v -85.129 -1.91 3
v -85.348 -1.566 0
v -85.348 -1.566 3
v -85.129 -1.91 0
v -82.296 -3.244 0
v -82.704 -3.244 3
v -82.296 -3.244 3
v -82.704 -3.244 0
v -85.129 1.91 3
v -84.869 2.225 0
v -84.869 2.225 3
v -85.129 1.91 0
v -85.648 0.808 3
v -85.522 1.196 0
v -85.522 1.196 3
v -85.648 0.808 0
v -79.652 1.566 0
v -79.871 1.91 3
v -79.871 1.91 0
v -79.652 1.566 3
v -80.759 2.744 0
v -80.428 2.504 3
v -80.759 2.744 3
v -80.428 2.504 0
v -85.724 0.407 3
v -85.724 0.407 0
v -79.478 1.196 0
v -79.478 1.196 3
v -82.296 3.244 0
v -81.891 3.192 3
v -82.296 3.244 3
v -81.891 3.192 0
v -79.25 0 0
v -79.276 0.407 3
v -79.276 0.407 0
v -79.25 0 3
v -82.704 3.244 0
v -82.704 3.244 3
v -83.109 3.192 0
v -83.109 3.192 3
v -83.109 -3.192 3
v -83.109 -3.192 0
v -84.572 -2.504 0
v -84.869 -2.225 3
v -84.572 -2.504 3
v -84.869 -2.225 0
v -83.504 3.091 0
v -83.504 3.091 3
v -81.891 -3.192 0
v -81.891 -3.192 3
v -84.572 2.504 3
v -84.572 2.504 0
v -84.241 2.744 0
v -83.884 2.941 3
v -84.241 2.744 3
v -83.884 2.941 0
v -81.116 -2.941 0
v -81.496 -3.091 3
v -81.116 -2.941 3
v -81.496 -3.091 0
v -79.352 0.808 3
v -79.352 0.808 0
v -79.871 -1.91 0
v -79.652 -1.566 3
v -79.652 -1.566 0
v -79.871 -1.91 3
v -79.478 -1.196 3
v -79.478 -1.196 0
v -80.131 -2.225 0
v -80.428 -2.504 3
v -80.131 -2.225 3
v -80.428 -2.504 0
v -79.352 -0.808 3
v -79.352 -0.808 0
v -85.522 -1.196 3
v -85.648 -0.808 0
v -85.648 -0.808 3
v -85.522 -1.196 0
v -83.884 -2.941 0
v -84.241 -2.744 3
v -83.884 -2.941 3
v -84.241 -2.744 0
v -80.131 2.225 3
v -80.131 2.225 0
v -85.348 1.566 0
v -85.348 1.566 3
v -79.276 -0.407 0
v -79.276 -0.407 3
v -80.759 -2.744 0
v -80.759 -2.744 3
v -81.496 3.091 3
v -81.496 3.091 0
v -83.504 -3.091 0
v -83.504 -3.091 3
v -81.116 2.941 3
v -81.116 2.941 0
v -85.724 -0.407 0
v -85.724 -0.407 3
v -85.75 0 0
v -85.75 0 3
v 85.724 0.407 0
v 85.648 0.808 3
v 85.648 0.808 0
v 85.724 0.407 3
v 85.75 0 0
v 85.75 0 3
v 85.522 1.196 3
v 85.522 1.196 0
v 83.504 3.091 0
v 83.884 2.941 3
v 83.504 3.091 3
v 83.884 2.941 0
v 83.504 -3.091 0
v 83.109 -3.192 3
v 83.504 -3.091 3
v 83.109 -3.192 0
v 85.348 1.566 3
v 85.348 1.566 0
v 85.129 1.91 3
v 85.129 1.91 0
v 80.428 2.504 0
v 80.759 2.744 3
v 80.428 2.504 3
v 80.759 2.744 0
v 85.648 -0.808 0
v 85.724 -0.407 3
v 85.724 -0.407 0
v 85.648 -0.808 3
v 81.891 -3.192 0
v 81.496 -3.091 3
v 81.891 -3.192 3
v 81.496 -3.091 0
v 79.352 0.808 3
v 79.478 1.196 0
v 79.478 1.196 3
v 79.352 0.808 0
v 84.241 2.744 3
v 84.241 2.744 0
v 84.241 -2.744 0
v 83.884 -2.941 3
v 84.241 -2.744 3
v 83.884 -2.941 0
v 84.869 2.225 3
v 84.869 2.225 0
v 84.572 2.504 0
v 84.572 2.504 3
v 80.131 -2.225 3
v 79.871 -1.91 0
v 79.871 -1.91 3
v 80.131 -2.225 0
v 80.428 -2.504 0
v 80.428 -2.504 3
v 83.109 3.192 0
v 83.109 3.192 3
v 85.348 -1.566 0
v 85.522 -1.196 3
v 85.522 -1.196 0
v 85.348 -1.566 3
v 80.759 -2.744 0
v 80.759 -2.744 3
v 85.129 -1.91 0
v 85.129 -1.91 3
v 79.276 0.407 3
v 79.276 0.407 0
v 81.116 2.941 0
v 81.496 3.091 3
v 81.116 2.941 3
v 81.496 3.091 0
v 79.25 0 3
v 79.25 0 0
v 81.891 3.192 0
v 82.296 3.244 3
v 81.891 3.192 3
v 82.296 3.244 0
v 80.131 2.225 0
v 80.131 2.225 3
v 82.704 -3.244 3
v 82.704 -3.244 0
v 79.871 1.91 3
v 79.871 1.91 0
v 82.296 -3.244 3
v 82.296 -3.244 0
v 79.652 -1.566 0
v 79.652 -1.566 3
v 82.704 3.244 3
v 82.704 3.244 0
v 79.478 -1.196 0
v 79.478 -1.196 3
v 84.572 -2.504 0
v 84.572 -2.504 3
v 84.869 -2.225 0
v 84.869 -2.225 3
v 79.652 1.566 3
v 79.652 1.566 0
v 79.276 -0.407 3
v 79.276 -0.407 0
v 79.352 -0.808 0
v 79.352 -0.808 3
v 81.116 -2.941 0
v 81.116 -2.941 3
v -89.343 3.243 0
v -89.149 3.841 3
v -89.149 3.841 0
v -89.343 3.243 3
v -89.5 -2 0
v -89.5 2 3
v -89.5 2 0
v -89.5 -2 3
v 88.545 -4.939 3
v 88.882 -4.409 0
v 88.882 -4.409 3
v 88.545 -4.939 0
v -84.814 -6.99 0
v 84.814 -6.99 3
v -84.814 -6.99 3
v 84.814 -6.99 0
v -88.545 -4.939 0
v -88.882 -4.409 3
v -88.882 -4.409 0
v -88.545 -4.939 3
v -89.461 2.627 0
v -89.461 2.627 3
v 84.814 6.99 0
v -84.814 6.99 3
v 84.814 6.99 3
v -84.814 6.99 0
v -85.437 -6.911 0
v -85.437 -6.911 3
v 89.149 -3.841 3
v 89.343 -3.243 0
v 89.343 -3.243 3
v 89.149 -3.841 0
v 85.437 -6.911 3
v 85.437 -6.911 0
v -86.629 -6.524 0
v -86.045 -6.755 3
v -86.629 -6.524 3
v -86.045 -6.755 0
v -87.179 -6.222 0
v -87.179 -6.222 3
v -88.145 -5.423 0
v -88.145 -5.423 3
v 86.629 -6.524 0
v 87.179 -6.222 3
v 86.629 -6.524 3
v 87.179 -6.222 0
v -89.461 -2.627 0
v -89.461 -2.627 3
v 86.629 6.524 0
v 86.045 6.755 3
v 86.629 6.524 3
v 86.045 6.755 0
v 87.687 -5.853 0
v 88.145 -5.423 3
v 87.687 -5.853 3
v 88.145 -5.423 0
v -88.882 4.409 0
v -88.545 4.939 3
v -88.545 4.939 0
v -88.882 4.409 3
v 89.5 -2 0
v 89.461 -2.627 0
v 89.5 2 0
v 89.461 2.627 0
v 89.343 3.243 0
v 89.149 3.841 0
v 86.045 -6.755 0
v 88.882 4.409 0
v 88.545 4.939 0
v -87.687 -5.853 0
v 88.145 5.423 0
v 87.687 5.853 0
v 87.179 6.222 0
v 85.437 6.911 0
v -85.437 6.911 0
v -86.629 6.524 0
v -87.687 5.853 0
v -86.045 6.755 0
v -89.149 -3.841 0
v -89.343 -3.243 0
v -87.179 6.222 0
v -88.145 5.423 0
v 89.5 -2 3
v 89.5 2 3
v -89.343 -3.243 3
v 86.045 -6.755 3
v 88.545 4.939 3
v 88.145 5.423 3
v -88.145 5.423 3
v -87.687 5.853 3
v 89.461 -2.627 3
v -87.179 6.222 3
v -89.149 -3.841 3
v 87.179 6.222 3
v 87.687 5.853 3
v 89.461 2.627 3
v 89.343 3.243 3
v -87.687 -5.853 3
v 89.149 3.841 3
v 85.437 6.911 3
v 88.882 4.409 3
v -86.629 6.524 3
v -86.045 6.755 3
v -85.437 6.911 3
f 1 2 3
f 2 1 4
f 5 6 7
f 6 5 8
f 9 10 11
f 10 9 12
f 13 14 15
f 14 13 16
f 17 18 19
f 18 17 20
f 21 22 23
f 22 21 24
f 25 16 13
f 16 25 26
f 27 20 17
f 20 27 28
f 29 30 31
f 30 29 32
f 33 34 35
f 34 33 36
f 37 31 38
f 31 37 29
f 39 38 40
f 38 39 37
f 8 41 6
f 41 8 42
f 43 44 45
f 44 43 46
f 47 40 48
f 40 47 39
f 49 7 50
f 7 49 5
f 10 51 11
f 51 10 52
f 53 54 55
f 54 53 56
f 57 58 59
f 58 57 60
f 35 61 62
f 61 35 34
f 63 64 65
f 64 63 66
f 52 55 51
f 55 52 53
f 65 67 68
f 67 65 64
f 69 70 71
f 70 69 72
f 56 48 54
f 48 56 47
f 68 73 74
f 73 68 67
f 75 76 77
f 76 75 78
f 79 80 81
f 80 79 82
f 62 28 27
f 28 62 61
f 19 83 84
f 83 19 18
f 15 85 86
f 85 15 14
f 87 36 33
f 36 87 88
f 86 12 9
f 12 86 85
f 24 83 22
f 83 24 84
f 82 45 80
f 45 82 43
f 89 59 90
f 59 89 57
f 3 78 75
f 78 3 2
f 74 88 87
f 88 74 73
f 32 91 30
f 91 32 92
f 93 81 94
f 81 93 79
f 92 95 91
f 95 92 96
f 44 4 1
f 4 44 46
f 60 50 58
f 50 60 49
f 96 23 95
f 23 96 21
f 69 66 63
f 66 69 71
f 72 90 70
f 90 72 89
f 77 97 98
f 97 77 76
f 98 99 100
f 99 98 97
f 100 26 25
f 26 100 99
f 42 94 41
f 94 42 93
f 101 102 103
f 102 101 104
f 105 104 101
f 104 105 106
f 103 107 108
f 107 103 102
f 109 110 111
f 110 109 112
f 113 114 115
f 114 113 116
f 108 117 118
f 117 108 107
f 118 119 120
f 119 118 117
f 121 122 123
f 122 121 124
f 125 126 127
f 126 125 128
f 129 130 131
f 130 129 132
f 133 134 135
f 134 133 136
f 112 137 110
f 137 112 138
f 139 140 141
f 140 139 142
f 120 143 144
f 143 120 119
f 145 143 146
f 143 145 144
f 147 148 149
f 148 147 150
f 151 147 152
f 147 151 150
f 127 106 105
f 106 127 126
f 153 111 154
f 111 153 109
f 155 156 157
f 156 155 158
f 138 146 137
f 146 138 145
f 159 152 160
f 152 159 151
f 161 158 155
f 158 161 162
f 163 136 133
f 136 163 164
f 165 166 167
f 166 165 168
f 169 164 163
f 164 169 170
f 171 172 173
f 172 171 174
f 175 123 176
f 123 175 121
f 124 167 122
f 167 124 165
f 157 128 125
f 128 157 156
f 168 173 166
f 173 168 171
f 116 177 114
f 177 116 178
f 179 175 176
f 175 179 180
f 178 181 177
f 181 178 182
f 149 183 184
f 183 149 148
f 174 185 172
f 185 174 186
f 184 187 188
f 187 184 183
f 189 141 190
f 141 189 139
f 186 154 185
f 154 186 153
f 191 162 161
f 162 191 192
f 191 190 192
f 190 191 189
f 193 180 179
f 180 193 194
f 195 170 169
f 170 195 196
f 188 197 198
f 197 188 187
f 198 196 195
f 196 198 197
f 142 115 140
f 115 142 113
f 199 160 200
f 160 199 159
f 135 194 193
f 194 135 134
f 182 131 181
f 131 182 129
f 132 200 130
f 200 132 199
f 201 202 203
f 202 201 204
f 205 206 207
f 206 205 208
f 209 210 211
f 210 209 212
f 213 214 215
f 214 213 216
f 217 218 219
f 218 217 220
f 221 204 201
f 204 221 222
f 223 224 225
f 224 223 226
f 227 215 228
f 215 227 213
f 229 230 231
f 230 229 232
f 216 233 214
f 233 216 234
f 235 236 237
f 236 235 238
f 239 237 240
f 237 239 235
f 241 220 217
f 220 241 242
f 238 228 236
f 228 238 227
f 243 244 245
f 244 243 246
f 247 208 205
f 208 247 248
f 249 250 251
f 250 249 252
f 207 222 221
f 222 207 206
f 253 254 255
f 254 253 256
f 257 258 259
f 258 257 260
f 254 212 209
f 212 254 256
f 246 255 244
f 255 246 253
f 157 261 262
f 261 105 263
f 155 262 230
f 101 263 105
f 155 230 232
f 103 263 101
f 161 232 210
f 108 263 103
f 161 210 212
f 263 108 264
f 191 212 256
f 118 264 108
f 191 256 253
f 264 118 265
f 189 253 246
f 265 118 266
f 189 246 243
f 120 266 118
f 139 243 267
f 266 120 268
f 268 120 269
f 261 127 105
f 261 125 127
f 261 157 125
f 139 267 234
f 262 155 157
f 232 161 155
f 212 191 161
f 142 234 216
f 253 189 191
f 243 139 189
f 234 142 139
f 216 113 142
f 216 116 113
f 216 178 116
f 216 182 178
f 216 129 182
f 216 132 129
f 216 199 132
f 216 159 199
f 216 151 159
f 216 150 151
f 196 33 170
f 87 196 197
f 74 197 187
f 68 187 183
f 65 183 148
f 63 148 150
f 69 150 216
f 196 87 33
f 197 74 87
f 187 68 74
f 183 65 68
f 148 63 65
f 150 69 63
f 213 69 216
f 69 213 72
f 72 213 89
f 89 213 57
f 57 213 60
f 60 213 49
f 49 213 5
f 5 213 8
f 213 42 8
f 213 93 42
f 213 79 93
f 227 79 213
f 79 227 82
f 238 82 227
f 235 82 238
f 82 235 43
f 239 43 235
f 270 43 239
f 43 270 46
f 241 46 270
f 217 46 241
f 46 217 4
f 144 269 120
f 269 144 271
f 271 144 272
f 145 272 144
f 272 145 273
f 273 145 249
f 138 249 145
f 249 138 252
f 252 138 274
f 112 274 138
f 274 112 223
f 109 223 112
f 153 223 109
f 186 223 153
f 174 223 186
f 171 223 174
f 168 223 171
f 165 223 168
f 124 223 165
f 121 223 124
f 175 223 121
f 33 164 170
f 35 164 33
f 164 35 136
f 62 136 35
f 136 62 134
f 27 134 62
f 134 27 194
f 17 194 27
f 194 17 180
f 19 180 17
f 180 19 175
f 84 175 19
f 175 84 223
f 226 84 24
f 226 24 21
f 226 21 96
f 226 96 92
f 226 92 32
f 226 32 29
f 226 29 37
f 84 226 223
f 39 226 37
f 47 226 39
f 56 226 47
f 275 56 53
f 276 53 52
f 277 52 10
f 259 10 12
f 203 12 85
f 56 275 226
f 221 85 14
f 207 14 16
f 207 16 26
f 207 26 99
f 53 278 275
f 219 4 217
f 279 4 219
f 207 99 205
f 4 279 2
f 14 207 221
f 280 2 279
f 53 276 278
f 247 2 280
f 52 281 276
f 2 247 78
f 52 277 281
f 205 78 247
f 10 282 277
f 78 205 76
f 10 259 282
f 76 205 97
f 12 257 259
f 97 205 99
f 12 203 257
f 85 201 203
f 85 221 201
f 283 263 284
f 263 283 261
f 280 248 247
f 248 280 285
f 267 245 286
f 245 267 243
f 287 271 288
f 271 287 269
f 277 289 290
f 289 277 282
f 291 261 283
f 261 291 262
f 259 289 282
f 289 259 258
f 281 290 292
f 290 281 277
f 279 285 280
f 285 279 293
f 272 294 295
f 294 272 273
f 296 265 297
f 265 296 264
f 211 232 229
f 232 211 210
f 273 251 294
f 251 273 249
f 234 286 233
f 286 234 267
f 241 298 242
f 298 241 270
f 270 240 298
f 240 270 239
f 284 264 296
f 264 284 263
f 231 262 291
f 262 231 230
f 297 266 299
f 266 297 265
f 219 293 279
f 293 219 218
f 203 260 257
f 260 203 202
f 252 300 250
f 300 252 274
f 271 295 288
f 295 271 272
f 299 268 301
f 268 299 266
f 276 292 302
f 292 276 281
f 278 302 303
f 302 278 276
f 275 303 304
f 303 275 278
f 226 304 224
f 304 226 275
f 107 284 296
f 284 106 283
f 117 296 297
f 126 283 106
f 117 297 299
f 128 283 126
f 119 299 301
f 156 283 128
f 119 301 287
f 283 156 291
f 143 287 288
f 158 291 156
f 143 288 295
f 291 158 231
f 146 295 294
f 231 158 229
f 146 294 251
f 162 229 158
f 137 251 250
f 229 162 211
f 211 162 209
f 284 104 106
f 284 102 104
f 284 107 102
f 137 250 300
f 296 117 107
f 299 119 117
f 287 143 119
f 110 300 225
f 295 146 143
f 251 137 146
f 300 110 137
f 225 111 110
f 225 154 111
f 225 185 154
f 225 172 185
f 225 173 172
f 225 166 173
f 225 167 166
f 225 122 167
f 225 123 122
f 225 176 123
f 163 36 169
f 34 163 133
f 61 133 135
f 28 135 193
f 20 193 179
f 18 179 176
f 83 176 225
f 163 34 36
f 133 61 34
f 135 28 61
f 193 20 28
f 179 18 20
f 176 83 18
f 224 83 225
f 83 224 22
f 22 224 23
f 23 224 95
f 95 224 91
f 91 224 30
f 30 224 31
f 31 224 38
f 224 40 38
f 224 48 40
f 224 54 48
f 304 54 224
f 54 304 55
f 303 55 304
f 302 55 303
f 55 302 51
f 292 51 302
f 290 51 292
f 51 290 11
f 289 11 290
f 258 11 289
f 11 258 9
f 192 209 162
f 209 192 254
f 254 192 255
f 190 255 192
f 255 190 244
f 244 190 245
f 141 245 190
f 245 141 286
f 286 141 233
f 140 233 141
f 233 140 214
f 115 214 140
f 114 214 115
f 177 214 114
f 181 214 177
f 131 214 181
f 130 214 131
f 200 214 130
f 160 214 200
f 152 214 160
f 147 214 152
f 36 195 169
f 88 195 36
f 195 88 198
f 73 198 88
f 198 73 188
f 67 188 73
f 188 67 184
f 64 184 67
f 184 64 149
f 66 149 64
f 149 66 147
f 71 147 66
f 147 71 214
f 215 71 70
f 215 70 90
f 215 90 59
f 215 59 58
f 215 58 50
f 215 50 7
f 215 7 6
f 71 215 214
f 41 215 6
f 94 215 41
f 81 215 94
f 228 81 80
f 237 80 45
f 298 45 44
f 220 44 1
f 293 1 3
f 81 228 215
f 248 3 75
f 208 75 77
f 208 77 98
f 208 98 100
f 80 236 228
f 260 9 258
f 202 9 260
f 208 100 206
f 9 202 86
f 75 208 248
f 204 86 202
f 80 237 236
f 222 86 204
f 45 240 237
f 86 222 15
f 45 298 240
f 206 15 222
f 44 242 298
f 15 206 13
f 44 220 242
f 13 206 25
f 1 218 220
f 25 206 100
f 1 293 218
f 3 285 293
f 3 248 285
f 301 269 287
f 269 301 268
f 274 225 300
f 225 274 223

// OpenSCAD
$fn = 50;


difference() {
	union() {
		hull() {
			translate(v = [-84.5000000000, 2.0000000000, 0]) {
				cylinder(h = 3, r = 5);
			}
			translate(v = [84.5000000000, 2.0000000000, 0]) {
				cylinder(h = 3, r = 5);
			}
			translate(v = [-84.5000000000, -2.0000000000, 0]) {
				cylinder(h = 3, r = 5);
			}
			translate(v = [84.5000000000, -2.0000000000, 0]) {
				cylinder(h = 3, r = 5);
			}
		}
	}
	union() {
		translate(v = [-82.5000000000, 0.0000000000, -100.0000000000]) {
			cylinder(h = 200, r = 3.2500000000);
		}
		translate(v = [-82.5000000000, 0.0000000000, -100.0000000000]) {
			cylinder(h = 200, r = 3.2500000000);
		}
		translate(v = [82.5000000000, 0.0000000000, -100.0000000000]) {
			cylinder(h = 200, r = 3.2500000000);
		}
		translate(v = [82.5000000000, 0.0000000000, -100.0000000000]) {
			cylinder(h = 200, r = 3.2500000000);
		}
	}
}
